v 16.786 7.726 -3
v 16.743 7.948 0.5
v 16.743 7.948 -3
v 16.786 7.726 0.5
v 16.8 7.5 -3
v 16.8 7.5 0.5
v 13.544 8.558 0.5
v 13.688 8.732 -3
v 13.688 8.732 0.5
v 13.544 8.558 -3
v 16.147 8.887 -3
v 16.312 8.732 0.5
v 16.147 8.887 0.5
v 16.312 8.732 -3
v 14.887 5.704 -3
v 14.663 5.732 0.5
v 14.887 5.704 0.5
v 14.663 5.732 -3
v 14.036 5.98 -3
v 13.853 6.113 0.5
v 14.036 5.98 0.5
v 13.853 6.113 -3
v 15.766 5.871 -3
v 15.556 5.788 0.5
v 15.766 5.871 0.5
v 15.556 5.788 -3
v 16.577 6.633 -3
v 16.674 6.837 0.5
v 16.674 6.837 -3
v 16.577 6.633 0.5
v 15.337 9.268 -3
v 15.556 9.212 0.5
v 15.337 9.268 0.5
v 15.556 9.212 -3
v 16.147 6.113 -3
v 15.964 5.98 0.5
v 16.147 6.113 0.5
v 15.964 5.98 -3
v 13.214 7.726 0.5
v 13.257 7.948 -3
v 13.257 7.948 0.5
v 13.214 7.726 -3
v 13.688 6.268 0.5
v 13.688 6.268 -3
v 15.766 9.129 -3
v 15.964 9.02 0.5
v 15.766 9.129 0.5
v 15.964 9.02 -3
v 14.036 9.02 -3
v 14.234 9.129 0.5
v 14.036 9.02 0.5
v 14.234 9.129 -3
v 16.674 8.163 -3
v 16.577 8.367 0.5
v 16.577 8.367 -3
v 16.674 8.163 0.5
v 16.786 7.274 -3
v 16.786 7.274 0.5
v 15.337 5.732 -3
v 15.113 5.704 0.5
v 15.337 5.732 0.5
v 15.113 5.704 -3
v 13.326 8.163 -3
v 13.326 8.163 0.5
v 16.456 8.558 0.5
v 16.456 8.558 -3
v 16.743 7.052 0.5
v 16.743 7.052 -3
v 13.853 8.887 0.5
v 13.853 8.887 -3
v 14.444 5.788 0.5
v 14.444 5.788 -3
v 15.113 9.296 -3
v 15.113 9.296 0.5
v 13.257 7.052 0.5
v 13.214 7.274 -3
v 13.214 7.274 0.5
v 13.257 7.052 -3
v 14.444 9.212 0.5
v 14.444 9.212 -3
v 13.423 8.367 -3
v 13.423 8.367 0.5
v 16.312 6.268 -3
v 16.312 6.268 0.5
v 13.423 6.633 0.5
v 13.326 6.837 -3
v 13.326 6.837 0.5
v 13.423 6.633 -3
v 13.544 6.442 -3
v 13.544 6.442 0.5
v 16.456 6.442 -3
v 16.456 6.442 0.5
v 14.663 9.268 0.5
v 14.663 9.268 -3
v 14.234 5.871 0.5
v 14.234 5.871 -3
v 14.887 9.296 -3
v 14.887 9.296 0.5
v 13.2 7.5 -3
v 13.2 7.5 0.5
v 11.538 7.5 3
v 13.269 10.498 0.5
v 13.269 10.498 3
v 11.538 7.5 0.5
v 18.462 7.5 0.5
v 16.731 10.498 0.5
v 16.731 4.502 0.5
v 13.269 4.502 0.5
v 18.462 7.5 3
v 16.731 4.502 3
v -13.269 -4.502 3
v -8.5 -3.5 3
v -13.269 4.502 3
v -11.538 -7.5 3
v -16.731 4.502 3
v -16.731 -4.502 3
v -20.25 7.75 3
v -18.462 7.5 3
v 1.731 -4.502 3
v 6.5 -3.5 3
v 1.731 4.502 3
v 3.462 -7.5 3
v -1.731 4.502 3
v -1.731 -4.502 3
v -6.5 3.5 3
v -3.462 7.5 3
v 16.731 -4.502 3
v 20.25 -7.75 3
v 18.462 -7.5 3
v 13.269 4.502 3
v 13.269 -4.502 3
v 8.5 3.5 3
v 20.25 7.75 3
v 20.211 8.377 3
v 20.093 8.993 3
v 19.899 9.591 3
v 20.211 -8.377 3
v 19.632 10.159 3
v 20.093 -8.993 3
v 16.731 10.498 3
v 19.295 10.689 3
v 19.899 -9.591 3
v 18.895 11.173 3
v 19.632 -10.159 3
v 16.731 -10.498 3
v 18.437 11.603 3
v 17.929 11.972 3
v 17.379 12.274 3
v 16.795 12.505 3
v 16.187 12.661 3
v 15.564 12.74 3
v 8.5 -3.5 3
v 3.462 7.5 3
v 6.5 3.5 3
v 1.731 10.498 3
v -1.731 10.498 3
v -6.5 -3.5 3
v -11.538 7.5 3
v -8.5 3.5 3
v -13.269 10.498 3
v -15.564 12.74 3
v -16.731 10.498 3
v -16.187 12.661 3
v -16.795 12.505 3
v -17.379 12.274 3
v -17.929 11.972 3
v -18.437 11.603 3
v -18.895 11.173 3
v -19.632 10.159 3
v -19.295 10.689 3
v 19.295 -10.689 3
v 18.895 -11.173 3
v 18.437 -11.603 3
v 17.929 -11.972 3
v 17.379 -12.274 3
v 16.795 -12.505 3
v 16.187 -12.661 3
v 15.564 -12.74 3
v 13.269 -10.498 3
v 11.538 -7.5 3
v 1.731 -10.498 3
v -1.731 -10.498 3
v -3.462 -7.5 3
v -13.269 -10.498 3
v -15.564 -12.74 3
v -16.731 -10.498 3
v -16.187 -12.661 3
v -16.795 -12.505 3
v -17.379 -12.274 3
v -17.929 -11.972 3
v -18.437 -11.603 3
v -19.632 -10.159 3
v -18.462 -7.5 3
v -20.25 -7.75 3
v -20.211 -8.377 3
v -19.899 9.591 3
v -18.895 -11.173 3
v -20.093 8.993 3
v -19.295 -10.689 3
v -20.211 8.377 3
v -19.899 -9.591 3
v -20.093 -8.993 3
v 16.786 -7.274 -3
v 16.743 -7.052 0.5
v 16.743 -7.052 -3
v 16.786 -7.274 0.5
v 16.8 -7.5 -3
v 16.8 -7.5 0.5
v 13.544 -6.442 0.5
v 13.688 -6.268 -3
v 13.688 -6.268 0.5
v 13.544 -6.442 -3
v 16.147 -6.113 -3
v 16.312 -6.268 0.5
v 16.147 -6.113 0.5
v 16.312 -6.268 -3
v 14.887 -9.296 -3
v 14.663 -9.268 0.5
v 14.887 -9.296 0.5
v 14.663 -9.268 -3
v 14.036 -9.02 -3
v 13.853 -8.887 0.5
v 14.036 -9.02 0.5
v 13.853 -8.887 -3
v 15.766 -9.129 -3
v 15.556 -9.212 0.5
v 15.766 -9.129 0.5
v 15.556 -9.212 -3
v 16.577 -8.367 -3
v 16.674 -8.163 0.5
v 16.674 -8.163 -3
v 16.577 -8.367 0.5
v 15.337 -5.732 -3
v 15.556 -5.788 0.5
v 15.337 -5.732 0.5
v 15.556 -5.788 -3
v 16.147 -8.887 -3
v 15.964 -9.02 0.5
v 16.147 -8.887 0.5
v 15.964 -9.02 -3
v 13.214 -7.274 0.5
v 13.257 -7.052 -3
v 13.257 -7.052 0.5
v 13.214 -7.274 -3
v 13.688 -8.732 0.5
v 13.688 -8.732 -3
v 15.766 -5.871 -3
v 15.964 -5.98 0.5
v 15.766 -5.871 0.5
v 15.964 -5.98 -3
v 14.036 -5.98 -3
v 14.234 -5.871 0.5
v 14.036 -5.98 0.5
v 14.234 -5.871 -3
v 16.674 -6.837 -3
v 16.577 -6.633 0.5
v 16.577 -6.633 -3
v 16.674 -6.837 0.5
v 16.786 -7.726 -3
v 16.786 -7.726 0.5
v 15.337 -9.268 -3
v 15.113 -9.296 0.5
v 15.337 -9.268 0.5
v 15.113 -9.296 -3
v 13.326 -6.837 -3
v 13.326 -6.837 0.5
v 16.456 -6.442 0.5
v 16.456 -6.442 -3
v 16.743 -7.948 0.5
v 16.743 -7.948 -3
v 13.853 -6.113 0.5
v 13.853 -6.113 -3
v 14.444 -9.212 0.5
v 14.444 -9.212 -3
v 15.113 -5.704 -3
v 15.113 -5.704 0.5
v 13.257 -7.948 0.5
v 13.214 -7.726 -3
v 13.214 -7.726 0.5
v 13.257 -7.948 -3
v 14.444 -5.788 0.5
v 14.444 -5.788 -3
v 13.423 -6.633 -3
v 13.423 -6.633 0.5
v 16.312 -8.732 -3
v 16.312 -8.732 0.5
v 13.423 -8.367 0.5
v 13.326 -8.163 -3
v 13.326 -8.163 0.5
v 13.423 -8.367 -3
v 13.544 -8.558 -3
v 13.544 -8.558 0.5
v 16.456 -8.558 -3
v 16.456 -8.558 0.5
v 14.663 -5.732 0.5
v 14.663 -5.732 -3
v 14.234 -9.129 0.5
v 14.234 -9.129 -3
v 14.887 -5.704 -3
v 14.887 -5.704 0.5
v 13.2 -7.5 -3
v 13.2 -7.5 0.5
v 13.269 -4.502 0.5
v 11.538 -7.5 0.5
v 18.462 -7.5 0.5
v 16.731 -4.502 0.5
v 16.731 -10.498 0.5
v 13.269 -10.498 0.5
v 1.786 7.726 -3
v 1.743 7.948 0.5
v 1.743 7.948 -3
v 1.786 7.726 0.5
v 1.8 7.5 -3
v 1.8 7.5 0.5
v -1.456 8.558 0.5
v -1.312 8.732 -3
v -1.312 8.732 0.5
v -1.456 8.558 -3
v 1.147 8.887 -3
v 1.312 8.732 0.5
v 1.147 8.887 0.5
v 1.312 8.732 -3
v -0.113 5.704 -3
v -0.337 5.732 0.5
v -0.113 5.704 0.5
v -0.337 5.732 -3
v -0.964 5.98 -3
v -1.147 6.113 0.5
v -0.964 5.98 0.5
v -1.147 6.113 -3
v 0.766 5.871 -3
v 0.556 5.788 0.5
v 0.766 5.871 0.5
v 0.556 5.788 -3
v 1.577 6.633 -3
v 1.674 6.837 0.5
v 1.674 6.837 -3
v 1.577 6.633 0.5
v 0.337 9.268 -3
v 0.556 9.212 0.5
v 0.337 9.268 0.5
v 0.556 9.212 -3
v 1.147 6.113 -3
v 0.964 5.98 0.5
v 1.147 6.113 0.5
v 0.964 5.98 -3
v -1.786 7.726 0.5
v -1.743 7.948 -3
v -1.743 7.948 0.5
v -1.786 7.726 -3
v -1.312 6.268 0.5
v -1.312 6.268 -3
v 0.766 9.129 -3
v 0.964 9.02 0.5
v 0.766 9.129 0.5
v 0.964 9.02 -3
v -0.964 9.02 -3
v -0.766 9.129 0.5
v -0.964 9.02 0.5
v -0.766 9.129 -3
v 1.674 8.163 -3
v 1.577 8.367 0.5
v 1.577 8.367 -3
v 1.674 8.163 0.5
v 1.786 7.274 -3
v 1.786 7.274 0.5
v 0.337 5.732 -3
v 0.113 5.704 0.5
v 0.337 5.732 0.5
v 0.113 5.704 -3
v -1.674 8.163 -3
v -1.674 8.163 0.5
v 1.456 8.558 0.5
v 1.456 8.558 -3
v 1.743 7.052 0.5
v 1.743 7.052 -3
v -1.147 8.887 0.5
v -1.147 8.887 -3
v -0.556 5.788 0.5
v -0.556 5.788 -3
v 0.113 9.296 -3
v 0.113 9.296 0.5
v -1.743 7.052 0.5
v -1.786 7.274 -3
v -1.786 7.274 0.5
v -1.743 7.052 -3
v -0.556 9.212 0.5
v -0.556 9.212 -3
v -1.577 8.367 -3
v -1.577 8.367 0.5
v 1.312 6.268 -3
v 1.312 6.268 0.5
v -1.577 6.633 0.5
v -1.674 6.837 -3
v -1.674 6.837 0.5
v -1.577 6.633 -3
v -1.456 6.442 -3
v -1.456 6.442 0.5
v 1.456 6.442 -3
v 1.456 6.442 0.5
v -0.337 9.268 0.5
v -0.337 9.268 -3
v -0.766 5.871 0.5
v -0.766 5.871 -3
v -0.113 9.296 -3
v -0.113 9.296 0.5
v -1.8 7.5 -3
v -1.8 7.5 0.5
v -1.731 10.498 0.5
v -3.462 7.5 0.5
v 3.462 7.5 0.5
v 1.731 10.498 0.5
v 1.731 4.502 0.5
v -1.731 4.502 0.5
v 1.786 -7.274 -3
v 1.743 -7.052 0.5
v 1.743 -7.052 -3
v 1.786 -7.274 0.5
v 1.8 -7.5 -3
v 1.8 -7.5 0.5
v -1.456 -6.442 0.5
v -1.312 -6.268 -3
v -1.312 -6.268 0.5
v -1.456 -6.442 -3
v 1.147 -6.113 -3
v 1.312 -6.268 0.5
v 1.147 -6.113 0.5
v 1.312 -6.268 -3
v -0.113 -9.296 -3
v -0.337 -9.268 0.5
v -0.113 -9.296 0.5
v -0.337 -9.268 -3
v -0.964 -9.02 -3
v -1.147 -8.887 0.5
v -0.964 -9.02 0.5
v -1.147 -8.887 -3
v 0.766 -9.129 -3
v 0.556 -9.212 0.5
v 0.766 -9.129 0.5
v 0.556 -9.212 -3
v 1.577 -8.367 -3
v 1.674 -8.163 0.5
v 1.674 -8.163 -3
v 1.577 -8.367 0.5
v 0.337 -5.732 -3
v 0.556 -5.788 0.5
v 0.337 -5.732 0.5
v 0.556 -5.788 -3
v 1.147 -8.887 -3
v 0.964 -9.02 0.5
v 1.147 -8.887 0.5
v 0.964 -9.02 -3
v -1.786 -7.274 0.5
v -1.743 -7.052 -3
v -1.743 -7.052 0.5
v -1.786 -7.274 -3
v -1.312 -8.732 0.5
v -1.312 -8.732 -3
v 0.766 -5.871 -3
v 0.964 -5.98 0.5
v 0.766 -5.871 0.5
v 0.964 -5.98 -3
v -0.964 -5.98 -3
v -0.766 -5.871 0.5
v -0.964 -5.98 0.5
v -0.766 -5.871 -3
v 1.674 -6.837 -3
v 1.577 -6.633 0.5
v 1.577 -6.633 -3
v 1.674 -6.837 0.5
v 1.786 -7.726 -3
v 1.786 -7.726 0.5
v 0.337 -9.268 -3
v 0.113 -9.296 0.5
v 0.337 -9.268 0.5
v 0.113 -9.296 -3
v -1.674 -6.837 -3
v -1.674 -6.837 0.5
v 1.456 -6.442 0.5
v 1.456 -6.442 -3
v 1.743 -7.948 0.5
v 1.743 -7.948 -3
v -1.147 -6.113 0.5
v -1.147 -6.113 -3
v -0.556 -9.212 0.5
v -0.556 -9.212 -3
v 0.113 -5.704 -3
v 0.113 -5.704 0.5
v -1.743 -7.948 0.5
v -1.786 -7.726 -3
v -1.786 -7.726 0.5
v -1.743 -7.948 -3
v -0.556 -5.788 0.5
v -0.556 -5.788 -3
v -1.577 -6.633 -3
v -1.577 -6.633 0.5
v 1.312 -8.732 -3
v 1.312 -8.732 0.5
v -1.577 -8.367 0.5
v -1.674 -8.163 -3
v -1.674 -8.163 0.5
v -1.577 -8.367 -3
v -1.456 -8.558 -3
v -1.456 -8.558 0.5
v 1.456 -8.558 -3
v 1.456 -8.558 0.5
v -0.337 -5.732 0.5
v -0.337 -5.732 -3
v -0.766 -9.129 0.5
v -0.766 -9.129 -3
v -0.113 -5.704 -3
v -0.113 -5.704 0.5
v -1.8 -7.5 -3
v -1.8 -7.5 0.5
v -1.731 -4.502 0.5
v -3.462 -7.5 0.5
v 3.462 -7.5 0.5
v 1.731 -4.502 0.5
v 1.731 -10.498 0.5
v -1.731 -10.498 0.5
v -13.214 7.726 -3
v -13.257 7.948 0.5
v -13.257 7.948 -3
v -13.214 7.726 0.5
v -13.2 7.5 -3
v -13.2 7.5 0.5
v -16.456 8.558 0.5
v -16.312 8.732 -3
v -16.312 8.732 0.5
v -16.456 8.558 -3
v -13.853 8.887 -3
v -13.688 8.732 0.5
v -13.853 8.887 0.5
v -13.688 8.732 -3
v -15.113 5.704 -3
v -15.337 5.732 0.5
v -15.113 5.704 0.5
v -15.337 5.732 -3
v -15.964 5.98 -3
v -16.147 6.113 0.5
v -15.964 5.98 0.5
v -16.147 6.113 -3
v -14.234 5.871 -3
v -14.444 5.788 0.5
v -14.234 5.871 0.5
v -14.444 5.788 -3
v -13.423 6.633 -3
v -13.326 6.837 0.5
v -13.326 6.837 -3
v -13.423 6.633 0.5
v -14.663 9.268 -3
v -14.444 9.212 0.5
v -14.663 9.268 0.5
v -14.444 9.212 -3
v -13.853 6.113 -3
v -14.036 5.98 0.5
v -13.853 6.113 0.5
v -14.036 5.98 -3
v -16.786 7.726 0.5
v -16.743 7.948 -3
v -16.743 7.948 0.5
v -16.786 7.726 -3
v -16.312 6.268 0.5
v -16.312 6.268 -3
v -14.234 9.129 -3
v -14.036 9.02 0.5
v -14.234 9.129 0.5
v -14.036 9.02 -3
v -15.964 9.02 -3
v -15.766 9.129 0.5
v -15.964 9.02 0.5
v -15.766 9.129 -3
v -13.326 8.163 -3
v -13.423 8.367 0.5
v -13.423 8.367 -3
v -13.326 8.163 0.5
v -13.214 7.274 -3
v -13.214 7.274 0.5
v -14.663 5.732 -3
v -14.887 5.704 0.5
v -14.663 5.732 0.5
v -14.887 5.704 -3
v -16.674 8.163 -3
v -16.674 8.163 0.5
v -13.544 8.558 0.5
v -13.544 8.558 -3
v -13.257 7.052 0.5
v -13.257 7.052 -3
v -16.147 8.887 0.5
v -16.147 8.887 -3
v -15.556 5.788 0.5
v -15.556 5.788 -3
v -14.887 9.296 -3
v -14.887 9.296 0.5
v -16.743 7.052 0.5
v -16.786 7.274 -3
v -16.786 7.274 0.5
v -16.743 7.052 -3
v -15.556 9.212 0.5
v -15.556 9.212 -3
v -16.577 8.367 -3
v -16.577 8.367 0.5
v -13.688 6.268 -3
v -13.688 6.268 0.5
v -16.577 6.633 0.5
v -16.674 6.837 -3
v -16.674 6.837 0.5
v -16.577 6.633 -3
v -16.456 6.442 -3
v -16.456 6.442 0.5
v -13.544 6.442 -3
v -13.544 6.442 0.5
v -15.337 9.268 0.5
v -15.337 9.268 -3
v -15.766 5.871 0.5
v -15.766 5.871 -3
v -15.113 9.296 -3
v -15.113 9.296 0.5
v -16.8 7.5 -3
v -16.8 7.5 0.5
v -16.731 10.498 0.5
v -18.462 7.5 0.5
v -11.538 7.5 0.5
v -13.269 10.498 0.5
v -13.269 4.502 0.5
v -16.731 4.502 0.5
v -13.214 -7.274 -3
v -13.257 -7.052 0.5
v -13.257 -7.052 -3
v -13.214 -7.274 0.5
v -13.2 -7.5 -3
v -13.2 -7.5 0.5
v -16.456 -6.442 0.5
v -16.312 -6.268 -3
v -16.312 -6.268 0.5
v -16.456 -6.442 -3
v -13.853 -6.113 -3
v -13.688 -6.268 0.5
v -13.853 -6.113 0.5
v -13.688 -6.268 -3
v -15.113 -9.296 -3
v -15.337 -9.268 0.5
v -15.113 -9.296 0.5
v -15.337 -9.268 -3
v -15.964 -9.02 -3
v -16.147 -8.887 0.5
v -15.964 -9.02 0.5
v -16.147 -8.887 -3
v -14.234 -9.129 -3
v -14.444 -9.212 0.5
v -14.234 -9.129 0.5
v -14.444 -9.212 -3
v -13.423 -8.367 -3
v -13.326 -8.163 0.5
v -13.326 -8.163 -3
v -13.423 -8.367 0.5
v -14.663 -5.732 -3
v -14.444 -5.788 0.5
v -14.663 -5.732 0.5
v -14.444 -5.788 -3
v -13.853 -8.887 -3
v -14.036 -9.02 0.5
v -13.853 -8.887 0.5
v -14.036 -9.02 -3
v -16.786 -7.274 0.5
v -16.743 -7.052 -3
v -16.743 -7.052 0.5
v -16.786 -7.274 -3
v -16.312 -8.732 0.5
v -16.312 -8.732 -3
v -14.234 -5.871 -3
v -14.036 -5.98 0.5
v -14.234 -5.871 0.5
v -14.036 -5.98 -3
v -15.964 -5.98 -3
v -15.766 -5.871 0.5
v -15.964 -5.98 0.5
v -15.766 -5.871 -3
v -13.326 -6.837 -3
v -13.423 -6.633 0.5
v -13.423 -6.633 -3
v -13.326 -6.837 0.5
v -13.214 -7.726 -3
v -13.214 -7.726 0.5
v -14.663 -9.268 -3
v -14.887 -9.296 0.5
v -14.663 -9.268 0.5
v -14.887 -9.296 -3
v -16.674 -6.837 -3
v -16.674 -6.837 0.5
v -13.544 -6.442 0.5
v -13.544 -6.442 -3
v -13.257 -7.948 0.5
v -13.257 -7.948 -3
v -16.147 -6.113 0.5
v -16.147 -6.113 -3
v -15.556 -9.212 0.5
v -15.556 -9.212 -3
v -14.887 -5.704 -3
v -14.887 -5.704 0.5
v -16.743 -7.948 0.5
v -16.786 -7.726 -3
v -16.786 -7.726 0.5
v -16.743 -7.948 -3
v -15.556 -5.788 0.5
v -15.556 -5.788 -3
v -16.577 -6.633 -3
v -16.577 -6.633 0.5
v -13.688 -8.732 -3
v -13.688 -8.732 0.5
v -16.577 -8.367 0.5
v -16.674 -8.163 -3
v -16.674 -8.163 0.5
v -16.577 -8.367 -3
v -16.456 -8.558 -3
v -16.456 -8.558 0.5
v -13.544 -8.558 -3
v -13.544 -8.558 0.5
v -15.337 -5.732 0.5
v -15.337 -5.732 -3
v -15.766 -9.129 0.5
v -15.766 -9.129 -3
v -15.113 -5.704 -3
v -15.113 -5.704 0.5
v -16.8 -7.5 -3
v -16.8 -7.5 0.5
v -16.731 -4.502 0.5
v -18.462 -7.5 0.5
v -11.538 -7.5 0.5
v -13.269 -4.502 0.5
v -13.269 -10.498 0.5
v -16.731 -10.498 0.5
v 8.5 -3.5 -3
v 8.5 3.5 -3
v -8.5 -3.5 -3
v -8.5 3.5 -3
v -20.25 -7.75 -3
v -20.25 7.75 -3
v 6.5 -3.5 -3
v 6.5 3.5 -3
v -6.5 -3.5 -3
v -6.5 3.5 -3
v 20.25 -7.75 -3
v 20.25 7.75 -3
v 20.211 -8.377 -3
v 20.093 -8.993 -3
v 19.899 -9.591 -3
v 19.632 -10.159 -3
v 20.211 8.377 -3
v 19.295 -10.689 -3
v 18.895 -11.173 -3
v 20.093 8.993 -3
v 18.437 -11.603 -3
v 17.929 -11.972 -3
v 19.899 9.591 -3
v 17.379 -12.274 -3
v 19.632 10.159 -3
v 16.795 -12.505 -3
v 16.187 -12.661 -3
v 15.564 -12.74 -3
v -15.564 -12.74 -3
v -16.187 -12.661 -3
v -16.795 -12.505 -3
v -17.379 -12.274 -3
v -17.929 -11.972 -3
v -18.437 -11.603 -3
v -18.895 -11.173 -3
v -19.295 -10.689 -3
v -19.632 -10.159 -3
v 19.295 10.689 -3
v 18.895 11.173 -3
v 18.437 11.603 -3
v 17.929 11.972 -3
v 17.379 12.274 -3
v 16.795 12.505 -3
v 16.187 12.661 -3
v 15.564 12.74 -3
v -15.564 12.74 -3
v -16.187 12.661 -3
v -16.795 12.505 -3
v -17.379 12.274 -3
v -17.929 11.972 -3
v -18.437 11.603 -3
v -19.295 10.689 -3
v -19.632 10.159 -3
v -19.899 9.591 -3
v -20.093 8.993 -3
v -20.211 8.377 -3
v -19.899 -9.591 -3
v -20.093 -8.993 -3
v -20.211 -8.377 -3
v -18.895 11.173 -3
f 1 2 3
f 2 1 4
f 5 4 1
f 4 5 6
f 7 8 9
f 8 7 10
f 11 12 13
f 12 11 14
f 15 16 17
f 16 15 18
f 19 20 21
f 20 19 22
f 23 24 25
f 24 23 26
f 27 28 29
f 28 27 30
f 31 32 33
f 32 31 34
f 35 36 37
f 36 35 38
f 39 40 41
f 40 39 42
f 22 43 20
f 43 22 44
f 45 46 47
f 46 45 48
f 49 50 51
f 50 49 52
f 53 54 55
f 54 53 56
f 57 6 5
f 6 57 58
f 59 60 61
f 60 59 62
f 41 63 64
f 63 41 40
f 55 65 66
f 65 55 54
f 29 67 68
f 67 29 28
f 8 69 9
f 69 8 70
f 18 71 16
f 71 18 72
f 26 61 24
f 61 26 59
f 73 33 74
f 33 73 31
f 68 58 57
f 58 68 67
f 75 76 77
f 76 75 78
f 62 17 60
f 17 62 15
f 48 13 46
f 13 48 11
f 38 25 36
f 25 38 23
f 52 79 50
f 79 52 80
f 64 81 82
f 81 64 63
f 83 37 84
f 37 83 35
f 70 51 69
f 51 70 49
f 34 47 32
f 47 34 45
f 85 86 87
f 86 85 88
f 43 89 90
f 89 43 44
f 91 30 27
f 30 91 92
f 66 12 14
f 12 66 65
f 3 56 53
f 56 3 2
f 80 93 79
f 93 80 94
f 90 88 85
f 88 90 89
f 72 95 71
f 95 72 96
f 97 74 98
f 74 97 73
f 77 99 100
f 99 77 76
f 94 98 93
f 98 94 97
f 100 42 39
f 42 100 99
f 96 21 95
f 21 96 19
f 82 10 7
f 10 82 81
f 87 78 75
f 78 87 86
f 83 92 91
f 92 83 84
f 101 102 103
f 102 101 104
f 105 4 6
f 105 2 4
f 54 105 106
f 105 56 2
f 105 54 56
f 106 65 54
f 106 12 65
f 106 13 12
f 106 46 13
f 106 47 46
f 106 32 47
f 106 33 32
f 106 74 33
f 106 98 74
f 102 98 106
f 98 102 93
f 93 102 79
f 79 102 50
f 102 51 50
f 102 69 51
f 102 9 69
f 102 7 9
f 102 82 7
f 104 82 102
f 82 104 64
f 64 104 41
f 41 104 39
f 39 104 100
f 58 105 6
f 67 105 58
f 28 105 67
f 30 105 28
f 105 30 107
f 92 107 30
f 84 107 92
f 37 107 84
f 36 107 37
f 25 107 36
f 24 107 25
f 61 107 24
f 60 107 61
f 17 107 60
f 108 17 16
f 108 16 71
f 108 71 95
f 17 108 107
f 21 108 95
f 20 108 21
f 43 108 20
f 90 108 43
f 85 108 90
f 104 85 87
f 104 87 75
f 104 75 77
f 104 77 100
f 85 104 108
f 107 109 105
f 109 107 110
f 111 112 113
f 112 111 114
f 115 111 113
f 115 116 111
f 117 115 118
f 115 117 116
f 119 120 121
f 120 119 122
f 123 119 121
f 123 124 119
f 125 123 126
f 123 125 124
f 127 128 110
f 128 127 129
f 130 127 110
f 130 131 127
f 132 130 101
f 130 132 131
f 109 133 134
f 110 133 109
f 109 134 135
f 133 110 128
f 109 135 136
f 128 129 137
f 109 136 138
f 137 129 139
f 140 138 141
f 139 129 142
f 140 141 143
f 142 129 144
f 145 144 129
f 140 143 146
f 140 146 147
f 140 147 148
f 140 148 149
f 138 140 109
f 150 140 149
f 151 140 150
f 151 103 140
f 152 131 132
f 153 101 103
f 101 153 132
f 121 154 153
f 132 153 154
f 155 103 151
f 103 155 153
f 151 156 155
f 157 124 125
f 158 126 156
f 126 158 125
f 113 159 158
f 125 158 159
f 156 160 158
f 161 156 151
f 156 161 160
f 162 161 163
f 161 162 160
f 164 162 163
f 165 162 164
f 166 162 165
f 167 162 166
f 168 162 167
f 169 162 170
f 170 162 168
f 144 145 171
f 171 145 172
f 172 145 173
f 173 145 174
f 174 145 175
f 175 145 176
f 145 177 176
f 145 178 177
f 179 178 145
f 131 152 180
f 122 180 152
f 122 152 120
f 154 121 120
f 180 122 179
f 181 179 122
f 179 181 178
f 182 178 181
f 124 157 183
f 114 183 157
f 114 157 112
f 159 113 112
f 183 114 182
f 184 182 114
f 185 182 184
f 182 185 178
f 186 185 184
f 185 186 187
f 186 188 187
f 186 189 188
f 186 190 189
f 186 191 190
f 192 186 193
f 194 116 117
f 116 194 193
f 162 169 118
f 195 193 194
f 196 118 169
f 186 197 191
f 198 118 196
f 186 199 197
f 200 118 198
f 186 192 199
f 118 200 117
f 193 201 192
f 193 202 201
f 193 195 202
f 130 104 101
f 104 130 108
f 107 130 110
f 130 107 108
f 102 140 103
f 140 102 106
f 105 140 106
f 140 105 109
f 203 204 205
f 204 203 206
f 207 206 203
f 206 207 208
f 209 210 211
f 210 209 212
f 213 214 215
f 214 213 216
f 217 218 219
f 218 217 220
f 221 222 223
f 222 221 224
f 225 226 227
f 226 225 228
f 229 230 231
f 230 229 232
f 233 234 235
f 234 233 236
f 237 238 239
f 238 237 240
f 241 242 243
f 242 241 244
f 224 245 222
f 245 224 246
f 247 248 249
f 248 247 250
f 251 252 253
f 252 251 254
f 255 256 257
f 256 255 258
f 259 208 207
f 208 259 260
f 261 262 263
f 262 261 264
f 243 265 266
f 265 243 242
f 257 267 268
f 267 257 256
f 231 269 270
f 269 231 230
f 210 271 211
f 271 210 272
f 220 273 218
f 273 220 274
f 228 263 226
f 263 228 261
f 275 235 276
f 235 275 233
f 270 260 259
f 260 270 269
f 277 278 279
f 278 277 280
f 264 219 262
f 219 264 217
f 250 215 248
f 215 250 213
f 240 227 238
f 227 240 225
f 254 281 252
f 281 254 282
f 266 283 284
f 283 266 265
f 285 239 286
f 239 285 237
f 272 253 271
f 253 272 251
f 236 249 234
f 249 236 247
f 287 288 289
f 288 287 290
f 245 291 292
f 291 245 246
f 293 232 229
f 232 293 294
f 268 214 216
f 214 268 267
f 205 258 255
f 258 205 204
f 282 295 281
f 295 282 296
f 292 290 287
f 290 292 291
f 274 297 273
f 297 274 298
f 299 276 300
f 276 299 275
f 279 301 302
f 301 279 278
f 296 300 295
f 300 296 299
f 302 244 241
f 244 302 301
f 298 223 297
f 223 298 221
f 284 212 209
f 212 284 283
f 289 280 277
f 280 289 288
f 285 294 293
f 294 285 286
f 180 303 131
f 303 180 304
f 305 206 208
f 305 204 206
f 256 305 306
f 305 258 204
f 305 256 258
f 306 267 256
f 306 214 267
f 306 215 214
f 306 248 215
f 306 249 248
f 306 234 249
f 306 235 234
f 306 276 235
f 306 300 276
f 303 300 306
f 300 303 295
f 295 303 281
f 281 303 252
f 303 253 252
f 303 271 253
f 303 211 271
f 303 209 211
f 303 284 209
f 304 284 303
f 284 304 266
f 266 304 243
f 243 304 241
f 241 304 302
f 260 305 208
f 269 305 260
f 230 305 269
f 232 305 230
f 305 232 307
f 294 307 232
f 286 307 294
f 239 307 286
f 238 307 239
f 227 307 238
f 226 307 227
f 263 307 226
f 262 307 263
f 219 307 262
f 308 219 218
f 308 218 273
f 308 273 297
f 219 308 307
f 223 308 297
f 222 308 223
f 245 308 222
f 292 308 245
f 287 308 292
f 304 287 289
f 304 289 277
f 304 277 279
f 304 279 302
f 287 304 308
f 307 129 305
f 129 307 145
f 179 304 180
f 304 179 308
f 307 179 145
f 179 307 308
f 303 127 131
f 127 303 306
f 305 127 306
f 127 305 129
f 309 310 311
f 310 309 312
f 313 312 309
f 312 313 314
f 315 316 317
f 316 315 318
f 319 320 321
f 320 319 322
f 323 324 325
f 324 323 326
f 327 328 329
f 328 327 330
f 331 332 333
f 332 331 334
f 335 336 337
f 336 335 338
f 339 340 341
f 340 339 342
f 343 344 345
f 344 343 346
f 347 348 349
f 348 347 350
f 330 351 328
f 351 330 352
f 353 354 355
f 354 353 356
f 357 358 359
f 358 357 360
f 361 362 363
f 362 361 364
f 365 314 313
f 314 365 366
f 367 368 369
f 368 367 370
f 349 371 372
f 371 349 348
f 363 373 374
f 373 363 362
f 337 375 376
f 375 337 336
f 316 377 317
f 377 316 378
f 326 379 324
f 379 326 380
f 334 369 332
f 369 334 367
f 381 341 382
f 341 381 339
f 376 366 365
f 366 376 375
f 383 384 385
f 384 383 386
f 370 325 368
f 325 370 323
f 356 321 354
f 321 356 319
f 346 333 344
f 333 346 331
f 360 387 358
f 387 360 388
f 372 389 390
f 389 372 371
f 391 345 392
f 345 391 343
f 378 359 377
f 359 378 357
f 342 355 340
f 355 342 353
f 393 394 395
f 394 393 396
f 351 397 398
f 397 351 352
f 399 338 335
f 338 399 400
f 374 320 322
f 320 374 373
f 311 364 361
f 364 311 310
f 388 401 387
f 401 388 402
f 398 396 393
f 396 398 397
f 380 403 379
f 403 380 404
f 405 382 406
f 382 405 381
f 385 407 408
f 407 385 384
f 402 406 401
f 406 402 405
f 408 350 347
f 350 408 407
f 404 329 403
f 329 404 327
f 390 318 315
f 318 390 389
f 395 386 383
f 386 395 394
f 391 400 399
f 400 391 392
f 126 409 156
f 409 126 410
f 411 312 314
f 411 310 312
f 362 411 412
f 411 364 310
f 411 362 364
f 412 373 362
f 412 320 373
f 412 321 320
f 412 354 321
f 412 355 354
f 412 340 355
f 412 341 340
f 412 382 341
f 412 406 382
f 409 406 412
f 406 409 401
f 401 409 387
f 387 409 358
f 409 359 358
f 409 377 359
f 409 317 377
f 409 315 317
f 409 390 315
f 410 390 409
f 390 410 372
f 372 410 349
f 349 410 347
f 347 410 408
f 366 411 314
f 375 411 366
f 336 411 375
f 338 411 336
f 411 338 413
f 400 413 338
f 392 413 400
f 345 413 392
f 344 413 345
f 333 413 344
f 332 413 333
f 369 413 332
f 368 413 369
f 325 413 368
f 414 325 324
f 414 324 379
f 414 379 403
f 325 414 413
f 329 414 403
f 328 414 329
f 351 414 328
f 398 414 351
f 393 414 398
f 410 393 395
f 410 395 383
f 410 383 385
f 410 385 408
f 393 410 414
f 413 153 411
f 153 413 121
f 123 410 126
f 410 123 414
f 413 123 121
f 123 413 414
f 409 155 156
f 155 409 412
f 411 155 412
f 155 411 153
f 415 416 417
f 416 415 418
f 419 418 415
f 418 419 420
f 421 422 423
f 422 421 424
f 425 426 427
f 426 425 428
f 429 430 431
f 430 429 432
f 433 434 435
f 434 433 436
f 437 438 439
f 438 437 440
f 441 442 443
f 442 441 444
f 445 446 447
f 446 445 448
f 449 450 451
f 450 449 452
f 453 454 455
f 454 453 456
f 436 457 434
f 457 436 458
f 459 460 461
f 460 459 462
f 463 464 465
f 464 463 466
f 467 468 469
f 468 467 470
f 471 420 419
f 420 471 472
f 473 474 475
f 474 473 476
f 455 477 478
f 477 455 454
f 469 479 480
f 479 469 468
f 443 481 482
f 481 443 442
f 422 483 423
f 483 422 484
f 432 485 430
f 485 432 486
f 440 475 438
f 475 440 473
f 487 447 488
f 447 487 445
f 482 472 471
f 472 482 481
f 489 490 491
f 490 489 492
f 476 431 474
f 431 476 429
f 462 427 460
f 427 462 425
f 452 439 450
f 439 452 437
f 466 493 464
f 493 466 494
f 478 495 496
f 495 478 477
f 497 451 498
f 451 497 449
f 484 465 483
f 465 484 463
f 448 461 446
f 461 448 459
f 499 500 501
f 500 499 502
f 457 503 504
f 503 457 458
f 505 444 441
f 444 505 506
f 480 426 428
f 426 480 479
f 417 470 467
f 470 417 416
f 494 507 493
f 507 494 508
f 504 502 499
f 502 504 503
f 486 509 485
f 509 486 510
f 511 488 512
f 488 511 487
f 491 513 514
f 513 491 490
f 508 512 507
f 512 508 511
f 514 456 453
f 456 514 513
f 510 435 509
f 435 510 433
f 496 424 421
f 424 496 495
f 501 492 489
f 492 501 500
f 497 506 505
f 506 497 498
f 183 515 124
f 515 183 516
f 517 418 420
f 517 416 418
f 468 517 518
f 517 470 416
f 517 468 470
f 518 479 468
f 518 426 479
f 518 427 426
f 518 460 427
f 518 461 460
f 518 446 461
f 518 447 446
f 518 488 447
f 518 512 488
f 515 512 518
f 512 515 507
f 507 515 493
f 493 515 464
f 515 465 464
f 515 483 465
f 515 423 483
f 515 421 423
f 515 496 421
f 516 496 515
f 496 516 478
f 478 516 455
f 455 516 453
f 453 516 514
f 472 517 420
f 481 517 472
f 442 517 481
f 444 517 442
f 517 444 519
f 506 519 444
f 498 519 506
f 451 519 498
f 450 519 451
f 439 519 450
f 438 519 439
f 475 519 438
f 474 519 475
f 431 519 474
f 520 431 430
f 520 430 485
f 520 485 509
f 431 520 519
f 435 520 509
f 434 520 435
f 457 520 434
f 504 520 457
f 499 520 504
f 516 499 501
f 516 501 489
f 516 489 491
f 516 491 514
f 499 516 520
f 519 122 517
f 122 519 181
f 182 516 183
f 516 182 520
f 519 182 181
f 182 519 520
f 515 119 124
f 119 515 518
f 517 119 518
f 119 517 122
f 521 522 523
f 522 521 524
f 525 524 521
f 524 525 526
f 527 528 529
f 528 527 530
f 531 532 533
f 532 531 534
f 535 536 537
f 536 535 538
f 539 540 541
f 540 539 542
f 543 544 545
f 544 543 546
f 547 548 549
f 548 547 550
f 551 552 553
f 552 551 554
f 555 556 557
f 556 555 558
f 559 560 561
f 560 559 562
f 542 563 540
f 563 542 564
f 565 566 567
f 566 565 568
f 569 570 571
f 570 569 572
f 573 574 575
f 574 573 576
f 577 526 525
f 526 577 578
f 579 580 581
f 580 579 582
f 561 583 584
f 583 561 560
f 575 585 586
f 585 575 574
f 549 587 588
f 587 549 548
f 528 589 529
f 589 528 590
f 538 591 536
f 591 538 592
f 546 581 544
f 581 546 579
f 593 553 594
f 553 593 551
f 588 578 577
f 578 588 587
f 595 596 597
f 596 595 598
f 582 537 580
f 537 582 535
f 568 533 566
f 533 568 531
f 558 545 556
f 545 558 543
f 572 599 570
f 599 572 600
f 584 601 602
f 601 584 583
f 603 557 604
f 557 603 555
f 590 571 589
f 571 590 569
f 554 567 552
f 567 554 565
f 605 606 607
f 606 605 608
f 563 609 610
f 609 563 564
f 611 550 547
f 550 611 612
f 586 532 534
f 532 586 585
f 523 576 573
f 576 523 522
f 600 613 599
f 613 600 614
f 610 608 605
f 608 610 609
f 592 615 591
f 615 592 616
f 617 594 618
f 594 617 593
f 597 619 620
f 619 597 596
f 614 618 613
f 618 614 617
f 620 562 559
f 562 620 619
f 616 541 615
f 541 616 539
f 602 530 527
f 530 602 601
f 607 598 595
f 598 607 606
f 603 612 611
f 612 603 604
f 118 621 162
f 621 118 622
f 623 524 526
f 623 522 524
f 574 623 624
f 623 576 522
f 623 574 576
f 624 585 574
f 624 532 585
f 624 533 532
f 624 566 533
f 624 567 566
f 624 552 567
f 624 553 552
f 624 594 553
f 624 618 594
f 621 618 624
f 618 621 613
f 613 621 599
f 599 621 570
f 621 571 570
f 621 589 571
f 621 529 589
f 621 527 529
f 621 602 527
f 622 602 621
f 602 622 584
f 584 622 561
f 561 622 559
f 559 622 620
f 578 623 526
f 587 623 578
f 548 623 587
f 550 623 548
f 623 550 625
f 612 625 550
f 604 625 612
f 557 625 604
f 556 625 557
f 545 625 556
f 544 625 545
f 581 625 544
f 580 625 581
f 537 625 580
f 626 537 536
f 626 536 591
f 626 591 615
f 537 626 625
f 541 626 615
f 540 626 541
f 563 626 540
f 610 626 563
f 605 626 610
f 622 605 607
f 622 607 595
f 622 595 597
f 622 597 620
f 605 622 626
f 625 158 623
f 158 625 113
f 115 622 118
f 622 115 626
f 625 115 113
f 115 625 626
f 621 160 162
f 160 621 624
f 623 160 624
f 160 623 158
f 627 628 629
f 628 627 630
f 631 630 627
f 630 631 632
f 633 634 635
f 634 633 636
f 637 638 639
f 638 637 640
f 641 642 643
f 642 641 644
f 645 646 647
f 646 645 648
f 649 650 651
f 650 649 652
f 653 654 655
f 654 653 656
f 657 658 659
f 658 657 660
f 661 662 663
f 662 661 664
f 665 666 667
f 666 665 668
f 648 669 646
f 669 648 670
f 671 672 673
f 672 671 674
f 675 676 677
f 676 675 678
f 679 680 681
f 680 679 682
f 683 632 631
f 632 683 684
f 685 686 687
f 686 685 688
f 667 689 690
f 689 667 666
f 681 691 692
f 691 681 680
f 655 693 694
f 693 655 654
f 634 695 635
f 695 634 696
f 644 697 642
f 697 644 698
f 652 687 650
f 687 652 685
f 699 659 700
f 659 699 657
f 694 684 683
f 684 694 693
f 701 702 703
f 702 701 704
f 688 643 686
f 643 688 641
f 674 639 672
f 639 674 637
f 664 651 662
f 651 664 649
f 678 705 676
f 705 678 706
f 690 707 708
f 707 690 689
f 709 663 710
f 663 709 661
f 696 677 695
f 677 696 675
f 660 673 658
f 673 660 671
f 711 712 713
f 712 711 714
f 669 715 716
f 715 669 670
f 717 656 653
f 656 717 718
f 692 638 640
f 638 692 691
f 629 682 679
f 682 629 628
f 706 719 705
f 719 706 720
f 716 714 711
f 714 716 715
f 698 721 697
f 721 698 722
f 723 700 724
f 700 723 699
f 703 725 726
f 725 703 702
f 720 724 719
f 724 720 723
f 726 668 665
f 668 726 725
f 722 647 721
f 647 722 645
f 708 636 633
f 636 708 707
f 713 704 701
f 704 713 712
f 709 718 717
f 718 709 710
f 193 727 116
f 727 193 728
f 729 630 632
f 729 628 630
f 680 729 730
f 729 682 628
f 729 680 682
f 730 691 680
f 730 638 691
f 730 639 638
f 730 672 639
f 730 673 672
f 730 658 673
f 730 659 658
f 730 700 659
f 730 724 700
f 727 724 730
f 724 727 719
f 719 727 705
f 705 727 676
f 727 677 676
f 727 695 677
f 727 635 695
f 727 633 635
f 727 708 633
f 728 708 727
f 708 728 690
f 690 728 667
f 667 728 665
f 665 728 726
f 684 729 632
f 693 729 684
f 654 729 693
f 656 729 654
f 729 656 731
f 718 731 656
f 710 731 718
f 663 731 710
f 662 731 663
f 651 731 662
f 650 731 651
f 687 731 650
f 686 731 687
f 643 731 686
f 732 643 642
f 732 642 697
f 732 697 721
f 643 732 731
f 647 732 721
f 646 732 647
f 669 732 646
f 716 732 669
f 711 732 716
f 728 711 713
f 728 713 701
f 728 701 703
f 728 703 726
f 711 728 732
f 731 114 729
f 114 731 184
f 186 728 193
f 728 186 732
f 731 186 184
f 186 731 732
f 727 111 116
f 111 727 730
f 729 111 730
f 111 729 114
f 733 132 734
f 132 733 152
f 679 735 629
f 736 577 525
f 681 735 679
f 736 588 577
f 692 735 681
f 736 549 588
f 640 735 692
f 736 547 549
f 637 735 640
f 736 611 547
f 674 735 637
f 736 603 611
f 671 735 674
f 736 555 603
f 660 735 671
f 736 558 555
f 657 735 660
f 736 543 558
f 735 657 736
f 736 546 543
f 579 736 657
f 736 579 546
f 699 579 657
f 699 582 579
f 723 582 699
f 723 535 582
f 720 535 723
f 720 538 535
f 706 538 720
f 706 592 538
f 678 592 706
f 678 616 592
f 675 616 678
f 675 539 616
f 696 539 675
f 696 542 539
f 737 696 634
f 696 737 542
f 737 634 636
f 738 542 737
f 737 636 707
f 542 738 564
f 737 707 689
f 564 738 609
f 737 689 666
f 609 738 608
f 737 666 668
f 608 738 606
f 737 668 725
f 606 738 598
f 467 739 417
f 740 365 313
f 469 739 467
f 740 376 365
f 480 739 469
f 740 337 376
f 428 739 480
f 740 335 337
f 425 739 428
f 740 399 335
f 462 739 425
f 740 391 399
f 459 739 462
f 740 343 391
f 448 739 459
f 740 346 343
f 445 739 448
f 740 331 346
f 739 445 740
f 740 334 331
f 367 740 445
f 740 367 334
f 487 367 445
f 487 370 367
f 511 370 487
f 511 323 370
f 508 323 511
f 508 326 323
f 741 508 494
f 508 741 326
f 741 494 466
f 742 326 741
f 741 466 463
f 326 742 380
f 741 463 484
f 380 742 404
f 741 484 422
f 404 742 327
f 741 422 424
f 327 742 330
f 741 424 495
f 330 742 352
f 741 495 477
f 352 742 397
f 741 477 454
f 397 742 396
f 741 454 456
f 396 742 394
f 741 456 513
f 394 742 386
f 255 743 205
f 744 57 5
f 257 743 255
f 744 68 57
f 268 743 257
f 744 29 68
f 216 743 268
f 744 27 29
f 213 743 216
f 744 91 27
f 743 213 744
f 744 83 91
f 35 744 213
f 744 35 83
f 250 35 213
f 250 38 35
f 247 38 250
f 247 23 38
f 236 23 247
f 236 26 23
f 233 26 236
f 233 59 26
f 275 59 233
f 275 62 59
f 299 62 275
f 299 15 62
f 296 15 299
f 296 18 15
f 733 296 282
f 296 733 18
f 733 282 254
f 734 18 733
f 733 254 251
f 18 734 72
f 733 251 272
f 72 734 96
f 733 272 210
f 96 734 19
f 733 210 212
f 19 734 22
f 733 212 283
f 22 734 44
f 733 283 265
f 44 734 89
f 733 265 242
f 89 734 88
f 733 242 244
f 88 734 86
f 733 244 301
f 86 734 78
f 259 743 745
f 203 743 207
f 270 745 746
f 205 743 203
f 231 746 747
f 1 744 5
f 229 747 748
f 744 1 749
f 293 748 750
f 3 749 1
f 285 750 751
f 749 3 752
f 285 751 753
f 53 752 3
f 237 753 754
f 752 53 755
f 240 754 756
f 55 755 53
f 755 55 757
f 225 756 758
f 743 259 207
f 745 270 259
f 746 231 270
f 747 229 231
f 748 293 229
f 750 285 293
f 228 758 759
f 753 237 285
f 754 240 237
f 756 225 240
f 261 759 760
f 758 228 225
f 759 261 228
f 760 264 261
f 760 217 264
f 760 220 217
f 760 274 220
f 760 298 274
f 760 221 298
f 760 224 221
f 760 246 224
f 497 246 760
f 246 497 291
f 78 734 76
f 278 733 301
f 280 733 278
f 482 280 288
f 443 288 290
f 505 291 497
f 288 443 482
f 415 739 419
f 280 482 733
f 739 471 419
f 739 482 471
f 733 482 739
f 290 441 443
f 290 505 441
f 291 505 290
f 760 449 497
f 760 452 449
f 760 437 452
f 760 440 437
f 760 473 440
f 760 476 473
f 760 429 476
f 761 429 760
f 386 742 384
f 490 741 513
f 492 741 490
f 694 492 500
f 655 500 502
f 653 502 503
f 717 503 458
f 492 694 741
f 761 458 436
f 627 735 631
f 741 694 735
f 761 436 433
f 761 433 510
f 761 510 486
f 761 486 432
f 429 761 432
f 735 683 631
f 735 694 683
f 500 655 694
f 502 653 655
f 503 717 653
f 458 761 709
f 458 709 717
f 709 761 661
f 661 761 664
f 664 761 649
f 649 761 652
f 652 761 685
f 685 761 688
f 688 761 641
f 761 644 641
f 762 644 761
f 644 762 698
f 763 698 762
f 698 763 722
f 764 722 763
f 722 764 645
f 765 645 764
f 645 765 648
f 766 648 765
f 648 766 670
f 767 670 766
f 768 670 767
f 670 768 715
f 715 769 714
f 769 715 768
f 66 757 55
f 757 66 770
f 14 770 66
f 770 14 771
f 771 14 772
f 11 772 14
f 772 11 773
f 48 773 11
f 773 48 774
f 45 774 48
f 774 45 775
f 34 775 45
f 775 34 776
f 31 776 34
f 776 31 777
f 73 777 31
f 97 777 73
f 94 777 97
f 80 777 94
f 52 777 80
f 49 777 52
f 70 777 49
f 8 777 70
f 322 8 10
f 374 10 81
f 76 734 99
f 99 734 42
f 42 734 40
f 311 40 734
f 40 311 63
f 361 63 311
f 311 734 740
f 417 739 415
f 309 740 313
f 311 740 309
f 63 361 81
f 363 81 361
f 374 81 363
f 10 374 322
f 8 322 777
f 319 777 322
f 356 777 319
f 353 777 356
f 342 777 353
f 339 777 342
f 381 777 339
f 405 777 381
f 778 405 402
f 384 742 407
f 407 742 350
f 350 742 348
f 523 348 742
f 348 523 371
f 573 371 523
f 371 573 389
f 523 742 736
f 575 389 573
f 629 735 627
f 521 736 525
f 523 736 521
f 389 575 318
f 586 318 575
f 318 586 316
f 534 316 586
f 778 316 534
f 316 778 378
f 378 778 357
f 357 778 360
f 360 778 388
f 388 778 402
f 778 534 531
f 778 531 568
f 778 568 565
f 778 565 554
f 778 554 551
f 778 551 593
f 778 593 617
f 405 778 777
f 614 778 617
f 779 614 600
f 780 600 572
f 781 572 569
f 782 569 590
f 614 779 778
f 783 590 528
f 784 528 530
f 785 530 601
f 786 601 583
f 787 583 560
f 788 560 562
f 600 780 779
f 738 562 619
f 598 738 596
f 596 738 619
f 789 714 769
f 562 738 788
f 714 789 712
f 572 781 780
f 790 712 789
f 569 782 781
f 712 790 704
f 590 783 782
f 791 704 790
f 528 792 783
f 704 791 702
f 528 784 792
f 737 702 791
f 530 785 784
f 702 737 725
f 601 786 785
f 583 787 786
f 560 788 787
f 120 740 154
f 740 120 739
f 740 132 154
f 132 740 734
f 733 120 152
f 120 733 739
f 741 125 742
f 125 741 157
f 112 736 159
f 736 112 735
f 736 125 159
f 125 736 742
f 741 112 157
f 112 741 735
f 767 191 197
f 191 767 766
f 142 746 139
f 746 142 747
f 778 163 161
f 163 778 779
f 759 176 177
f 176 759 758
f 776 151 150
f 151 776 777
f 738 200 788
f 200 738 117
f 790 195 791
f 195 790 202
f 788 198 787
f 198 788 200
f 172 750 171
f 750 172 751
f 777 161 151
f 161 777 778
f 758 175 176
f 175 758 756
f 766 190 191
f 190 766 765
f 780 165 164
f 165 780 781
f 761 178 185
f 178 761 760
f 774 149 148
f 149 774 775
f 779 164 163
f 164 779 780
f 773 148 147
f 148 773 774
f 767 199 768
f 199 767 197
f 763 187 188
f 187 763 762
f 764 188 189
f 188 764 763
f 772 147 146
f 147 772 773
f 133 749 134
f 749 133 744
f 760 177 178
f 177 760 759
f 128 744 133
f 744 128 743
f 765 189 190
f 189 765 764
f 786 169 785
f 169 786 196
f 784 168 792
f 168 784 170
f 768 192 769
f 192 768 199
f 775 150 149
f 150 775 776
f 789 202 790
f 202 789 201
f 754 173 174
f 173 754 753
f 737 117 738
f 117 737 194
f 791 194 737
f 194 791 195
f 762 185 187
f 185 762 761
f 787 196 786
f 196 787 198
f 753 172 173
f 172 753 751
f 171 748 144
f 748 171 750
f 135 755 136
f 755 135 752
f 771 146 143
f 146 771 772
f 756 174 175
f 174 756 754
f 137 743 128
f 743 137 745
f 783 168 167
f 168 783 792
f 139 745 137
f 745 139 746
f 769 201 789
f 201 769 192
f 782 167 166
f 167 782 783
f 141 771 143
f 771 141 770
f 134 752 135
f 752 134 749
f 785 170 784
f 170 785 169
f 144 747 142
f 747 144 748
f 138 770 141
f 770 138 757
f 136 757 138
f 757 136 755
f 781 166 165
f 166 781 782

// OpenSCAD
$fn = 50;


difference() {
	union() {
		translate(v = [0, 0, -3.0000000000]) {
			hull() {
				translate(v = [-15.2500000000, 7.7500000000, 0]) {
					cylinder(h = 6, r = 5);
				}
				translate(v = [15.2500000000, 7.7500000000, 0]) {
					cylinder(h = 6, r = 5);
				}
				translate(v = [-15.2500000000, -7.7500000000, 0]) {
					cylinder(h = 6, r = 5);
				}
				translate(v = [15.2500000000, -7.7500000000, 0]) {
					cylinder(h = 6, r = 5);
				}
			}
		}
	}
	union() {
		translate(v = [15, 7.5000000000, 3.0000000000]) {
			rotate(a = [0, 0, 0]) {
				difference() {
					union() {
						translate(v = [0, 0, -100.0000000000]) {
							cylinder(h = 200, r = 1.8000000000);
						}
						translate(v = [0, 0, -2.5000000000]) {
							linear_extrude(height = 2.5000000000) {
								polygon(points = [[3.4620000000, 0.0000000000], [1.7310000000, 2.9981799479], [-1.7310000000, 2.9981799479], [-3.4620000000, 0.0000000000], [-1.7310000000, -2.9981799479], [1.7310000000, -2.9981799479]]);
							}
						}
						translate(v = [0, 0, -100.0000000000]) {
							cylinder(h = 200, r = 1.8000000000);
						}
						translate(v = [0, 0, -100.0000000000]) {
							cylinder(h = 200, r = 1.8000000000);
						}
					}
					union();
				}
			}
		}
		translate(v = [15, -7.5000000000, 3.0000000000]) {
			rotate(a = [0, 0, 0]) {
				difference() {
					union() {
						translate(v = [0, 0, -100.0000000000]) {
							cylinder(h = 200, r = 1.8000000000);
						}
						translate(v = [0, 0, -2.5000000000]) {
							linear_extrude(height = 2.5000000000) {
								polygon(points = [[3.4620000000, 0.0000000000], [1.7310000000, 2.9981799479], [-1.7310000000, 2.9981799479], [-3.4620000000, 0.0000000000], [-1.7310000000, -2.9981799479], [1.7310000000, -2.9981799479]]);
							}
						}
						translate(v = [0, 0, -100.0000000000]) {
							cylinder(h = 200, r = 1.8000000000);
						}
						translate(v = [0, 0, -100.0000000000]) {
							cylinder(h = 200, r = 1.8000000000);
						}
					}
					union();
				}
			}
		}
		translate(v = [0, 7.5000000000, 3.0000000000]) {
			rotate(a = [0, 0, 0]) {
				difference() {
					union() {
						translate(v = [0, 0, -100.0000000000]) {
							cylinder(h = 200, r = 1.8000000000);
						}
						translate(v = [0, 0, -2.5000000000]) {
							linear_extrude(height = 2.5000000000) {
								polygon(points = [[3.4620000000, 0.0000000000], [1.7310000000, 2.9981799479], [-1.7310000000, 2.9981799479], [-3.4620000000, 0.0000000000], [-1.7310000000, -2.9981799479], [1.7310000000, -2.9981799479]]);
							}
						}
						translate(v = [0, 0, -100.0000000000]) {
							cylinder(h = 200, r = 1.8000000000);
						}
						translate(v = [0, 0, -100.0000000000]) {
							cylinder(h = 200, r = 1.8000000000);
						}
					}
					union();
				}
			}
		}
		translate(v = [0, -7.5000000000, 3.0000000000]) {
			rotate(a = [0, 0, 0]) {
				difference() {
					union() {
						translate(v = [0, 0, -100.0000000000]) {
							cylinder(h = 200, r = 1.8000000000);
						}
						translate(v = [0, 0, -2.5000000000]) {
							linear_extrude(height = 2.5000000000) {
								polygon(points = [[3.4620000000, 0.0000000000], [1.7310000000, 2.9981799479], [-1.7310000000, 2.9981799479], [-3.4620000000, 0.0000000000], [-1.7310000000, -2.9981799479], [1.7310000000, -2.9981799479]]);
							}
						}
						translate(v = [0, 0, -100.0000000000]) {
							cylinder(h = 200, r = 1.8000000000);
						}
						translate(v = [0, 0, -100.0000000000]) {
							cylinder(h = 200, r = 1.8000000000);
						}
					}
					union();
				}
			}
		}
		translate(v = [-15, 7.5000000000, 3.0000000000]) {
			rotate(a = [0, 0, 0]) {
				difference() {
					union() {
						translate(v = [0, 0, -100.0000000000]) {
							cylinder(h = 200, r = 1.8000000000);
						}
						translate(v = [0, 0, -2.5000000000]) {
							linear_extrude(height = 2.5000000000) {
								polygon(points = [[3.4620000000, 0.0000000000], [1.7310000000, 2.9981799479], [-1.7310000000, 2.9981799479], [-3.4620000000, 0.0000000000], [-1.7310000000, -2.9981799479], [1.7310000000, -2.9981799479]]);
							}
						}
						translate(v = [0, 0, -100.0000000000]) {
							cylinder(h = 200, r = 1.8000000000);
						}
						translate(v = [0, 0, -100.0000000000]) {
							cylinder(h = 200, r = 1.8000000000);
						}
					}
					union();
				}
			}
		}
		translate(v = [-15, -7.5000000000, 3.0000000000]) {
			rotate(a = [0, 0, 0]) {
				difference() {
					union() {
						translate(v = [0, 0, -100.0000000000]) {
							cylinder(h = 200, r = 1.8000000000);
						}
						translate(v = [0, 0, -2.5000000000]) {
							linear_extrude(height = 2.5000000000) {
								polygon(points = [[3.4620000000, 0.0000000000], [1.7310000000, 2.9981799479], [-1.7310000000, 2.9981799479], [-3.4620000000, 0.0000000000], [-1.7310000000, -2.9981799479], [1.7310000000, -2.9981799479]]);
							}
						}
						translate(v = [0, 0, -100.0000000000]) {
							cylinder(h = 200, r = 1.8000000000);
						}
						translate(v = [0, 0, -100.0000000000]) {
							cylinder(h = 200, r = 1.8000000000);
						}
					}
					union();
				}
			}
		}
		#translate(v = [6.5000000000, -3.5000000000, -3.0000000000]) {
			cube(size = [2, 7, 6]);
		}
		#translate(v = [-8.5000000000, -3.5000000000, -3.0000000000]) {
			cube(size = [2, 7, 6]);
		}
	}
}
